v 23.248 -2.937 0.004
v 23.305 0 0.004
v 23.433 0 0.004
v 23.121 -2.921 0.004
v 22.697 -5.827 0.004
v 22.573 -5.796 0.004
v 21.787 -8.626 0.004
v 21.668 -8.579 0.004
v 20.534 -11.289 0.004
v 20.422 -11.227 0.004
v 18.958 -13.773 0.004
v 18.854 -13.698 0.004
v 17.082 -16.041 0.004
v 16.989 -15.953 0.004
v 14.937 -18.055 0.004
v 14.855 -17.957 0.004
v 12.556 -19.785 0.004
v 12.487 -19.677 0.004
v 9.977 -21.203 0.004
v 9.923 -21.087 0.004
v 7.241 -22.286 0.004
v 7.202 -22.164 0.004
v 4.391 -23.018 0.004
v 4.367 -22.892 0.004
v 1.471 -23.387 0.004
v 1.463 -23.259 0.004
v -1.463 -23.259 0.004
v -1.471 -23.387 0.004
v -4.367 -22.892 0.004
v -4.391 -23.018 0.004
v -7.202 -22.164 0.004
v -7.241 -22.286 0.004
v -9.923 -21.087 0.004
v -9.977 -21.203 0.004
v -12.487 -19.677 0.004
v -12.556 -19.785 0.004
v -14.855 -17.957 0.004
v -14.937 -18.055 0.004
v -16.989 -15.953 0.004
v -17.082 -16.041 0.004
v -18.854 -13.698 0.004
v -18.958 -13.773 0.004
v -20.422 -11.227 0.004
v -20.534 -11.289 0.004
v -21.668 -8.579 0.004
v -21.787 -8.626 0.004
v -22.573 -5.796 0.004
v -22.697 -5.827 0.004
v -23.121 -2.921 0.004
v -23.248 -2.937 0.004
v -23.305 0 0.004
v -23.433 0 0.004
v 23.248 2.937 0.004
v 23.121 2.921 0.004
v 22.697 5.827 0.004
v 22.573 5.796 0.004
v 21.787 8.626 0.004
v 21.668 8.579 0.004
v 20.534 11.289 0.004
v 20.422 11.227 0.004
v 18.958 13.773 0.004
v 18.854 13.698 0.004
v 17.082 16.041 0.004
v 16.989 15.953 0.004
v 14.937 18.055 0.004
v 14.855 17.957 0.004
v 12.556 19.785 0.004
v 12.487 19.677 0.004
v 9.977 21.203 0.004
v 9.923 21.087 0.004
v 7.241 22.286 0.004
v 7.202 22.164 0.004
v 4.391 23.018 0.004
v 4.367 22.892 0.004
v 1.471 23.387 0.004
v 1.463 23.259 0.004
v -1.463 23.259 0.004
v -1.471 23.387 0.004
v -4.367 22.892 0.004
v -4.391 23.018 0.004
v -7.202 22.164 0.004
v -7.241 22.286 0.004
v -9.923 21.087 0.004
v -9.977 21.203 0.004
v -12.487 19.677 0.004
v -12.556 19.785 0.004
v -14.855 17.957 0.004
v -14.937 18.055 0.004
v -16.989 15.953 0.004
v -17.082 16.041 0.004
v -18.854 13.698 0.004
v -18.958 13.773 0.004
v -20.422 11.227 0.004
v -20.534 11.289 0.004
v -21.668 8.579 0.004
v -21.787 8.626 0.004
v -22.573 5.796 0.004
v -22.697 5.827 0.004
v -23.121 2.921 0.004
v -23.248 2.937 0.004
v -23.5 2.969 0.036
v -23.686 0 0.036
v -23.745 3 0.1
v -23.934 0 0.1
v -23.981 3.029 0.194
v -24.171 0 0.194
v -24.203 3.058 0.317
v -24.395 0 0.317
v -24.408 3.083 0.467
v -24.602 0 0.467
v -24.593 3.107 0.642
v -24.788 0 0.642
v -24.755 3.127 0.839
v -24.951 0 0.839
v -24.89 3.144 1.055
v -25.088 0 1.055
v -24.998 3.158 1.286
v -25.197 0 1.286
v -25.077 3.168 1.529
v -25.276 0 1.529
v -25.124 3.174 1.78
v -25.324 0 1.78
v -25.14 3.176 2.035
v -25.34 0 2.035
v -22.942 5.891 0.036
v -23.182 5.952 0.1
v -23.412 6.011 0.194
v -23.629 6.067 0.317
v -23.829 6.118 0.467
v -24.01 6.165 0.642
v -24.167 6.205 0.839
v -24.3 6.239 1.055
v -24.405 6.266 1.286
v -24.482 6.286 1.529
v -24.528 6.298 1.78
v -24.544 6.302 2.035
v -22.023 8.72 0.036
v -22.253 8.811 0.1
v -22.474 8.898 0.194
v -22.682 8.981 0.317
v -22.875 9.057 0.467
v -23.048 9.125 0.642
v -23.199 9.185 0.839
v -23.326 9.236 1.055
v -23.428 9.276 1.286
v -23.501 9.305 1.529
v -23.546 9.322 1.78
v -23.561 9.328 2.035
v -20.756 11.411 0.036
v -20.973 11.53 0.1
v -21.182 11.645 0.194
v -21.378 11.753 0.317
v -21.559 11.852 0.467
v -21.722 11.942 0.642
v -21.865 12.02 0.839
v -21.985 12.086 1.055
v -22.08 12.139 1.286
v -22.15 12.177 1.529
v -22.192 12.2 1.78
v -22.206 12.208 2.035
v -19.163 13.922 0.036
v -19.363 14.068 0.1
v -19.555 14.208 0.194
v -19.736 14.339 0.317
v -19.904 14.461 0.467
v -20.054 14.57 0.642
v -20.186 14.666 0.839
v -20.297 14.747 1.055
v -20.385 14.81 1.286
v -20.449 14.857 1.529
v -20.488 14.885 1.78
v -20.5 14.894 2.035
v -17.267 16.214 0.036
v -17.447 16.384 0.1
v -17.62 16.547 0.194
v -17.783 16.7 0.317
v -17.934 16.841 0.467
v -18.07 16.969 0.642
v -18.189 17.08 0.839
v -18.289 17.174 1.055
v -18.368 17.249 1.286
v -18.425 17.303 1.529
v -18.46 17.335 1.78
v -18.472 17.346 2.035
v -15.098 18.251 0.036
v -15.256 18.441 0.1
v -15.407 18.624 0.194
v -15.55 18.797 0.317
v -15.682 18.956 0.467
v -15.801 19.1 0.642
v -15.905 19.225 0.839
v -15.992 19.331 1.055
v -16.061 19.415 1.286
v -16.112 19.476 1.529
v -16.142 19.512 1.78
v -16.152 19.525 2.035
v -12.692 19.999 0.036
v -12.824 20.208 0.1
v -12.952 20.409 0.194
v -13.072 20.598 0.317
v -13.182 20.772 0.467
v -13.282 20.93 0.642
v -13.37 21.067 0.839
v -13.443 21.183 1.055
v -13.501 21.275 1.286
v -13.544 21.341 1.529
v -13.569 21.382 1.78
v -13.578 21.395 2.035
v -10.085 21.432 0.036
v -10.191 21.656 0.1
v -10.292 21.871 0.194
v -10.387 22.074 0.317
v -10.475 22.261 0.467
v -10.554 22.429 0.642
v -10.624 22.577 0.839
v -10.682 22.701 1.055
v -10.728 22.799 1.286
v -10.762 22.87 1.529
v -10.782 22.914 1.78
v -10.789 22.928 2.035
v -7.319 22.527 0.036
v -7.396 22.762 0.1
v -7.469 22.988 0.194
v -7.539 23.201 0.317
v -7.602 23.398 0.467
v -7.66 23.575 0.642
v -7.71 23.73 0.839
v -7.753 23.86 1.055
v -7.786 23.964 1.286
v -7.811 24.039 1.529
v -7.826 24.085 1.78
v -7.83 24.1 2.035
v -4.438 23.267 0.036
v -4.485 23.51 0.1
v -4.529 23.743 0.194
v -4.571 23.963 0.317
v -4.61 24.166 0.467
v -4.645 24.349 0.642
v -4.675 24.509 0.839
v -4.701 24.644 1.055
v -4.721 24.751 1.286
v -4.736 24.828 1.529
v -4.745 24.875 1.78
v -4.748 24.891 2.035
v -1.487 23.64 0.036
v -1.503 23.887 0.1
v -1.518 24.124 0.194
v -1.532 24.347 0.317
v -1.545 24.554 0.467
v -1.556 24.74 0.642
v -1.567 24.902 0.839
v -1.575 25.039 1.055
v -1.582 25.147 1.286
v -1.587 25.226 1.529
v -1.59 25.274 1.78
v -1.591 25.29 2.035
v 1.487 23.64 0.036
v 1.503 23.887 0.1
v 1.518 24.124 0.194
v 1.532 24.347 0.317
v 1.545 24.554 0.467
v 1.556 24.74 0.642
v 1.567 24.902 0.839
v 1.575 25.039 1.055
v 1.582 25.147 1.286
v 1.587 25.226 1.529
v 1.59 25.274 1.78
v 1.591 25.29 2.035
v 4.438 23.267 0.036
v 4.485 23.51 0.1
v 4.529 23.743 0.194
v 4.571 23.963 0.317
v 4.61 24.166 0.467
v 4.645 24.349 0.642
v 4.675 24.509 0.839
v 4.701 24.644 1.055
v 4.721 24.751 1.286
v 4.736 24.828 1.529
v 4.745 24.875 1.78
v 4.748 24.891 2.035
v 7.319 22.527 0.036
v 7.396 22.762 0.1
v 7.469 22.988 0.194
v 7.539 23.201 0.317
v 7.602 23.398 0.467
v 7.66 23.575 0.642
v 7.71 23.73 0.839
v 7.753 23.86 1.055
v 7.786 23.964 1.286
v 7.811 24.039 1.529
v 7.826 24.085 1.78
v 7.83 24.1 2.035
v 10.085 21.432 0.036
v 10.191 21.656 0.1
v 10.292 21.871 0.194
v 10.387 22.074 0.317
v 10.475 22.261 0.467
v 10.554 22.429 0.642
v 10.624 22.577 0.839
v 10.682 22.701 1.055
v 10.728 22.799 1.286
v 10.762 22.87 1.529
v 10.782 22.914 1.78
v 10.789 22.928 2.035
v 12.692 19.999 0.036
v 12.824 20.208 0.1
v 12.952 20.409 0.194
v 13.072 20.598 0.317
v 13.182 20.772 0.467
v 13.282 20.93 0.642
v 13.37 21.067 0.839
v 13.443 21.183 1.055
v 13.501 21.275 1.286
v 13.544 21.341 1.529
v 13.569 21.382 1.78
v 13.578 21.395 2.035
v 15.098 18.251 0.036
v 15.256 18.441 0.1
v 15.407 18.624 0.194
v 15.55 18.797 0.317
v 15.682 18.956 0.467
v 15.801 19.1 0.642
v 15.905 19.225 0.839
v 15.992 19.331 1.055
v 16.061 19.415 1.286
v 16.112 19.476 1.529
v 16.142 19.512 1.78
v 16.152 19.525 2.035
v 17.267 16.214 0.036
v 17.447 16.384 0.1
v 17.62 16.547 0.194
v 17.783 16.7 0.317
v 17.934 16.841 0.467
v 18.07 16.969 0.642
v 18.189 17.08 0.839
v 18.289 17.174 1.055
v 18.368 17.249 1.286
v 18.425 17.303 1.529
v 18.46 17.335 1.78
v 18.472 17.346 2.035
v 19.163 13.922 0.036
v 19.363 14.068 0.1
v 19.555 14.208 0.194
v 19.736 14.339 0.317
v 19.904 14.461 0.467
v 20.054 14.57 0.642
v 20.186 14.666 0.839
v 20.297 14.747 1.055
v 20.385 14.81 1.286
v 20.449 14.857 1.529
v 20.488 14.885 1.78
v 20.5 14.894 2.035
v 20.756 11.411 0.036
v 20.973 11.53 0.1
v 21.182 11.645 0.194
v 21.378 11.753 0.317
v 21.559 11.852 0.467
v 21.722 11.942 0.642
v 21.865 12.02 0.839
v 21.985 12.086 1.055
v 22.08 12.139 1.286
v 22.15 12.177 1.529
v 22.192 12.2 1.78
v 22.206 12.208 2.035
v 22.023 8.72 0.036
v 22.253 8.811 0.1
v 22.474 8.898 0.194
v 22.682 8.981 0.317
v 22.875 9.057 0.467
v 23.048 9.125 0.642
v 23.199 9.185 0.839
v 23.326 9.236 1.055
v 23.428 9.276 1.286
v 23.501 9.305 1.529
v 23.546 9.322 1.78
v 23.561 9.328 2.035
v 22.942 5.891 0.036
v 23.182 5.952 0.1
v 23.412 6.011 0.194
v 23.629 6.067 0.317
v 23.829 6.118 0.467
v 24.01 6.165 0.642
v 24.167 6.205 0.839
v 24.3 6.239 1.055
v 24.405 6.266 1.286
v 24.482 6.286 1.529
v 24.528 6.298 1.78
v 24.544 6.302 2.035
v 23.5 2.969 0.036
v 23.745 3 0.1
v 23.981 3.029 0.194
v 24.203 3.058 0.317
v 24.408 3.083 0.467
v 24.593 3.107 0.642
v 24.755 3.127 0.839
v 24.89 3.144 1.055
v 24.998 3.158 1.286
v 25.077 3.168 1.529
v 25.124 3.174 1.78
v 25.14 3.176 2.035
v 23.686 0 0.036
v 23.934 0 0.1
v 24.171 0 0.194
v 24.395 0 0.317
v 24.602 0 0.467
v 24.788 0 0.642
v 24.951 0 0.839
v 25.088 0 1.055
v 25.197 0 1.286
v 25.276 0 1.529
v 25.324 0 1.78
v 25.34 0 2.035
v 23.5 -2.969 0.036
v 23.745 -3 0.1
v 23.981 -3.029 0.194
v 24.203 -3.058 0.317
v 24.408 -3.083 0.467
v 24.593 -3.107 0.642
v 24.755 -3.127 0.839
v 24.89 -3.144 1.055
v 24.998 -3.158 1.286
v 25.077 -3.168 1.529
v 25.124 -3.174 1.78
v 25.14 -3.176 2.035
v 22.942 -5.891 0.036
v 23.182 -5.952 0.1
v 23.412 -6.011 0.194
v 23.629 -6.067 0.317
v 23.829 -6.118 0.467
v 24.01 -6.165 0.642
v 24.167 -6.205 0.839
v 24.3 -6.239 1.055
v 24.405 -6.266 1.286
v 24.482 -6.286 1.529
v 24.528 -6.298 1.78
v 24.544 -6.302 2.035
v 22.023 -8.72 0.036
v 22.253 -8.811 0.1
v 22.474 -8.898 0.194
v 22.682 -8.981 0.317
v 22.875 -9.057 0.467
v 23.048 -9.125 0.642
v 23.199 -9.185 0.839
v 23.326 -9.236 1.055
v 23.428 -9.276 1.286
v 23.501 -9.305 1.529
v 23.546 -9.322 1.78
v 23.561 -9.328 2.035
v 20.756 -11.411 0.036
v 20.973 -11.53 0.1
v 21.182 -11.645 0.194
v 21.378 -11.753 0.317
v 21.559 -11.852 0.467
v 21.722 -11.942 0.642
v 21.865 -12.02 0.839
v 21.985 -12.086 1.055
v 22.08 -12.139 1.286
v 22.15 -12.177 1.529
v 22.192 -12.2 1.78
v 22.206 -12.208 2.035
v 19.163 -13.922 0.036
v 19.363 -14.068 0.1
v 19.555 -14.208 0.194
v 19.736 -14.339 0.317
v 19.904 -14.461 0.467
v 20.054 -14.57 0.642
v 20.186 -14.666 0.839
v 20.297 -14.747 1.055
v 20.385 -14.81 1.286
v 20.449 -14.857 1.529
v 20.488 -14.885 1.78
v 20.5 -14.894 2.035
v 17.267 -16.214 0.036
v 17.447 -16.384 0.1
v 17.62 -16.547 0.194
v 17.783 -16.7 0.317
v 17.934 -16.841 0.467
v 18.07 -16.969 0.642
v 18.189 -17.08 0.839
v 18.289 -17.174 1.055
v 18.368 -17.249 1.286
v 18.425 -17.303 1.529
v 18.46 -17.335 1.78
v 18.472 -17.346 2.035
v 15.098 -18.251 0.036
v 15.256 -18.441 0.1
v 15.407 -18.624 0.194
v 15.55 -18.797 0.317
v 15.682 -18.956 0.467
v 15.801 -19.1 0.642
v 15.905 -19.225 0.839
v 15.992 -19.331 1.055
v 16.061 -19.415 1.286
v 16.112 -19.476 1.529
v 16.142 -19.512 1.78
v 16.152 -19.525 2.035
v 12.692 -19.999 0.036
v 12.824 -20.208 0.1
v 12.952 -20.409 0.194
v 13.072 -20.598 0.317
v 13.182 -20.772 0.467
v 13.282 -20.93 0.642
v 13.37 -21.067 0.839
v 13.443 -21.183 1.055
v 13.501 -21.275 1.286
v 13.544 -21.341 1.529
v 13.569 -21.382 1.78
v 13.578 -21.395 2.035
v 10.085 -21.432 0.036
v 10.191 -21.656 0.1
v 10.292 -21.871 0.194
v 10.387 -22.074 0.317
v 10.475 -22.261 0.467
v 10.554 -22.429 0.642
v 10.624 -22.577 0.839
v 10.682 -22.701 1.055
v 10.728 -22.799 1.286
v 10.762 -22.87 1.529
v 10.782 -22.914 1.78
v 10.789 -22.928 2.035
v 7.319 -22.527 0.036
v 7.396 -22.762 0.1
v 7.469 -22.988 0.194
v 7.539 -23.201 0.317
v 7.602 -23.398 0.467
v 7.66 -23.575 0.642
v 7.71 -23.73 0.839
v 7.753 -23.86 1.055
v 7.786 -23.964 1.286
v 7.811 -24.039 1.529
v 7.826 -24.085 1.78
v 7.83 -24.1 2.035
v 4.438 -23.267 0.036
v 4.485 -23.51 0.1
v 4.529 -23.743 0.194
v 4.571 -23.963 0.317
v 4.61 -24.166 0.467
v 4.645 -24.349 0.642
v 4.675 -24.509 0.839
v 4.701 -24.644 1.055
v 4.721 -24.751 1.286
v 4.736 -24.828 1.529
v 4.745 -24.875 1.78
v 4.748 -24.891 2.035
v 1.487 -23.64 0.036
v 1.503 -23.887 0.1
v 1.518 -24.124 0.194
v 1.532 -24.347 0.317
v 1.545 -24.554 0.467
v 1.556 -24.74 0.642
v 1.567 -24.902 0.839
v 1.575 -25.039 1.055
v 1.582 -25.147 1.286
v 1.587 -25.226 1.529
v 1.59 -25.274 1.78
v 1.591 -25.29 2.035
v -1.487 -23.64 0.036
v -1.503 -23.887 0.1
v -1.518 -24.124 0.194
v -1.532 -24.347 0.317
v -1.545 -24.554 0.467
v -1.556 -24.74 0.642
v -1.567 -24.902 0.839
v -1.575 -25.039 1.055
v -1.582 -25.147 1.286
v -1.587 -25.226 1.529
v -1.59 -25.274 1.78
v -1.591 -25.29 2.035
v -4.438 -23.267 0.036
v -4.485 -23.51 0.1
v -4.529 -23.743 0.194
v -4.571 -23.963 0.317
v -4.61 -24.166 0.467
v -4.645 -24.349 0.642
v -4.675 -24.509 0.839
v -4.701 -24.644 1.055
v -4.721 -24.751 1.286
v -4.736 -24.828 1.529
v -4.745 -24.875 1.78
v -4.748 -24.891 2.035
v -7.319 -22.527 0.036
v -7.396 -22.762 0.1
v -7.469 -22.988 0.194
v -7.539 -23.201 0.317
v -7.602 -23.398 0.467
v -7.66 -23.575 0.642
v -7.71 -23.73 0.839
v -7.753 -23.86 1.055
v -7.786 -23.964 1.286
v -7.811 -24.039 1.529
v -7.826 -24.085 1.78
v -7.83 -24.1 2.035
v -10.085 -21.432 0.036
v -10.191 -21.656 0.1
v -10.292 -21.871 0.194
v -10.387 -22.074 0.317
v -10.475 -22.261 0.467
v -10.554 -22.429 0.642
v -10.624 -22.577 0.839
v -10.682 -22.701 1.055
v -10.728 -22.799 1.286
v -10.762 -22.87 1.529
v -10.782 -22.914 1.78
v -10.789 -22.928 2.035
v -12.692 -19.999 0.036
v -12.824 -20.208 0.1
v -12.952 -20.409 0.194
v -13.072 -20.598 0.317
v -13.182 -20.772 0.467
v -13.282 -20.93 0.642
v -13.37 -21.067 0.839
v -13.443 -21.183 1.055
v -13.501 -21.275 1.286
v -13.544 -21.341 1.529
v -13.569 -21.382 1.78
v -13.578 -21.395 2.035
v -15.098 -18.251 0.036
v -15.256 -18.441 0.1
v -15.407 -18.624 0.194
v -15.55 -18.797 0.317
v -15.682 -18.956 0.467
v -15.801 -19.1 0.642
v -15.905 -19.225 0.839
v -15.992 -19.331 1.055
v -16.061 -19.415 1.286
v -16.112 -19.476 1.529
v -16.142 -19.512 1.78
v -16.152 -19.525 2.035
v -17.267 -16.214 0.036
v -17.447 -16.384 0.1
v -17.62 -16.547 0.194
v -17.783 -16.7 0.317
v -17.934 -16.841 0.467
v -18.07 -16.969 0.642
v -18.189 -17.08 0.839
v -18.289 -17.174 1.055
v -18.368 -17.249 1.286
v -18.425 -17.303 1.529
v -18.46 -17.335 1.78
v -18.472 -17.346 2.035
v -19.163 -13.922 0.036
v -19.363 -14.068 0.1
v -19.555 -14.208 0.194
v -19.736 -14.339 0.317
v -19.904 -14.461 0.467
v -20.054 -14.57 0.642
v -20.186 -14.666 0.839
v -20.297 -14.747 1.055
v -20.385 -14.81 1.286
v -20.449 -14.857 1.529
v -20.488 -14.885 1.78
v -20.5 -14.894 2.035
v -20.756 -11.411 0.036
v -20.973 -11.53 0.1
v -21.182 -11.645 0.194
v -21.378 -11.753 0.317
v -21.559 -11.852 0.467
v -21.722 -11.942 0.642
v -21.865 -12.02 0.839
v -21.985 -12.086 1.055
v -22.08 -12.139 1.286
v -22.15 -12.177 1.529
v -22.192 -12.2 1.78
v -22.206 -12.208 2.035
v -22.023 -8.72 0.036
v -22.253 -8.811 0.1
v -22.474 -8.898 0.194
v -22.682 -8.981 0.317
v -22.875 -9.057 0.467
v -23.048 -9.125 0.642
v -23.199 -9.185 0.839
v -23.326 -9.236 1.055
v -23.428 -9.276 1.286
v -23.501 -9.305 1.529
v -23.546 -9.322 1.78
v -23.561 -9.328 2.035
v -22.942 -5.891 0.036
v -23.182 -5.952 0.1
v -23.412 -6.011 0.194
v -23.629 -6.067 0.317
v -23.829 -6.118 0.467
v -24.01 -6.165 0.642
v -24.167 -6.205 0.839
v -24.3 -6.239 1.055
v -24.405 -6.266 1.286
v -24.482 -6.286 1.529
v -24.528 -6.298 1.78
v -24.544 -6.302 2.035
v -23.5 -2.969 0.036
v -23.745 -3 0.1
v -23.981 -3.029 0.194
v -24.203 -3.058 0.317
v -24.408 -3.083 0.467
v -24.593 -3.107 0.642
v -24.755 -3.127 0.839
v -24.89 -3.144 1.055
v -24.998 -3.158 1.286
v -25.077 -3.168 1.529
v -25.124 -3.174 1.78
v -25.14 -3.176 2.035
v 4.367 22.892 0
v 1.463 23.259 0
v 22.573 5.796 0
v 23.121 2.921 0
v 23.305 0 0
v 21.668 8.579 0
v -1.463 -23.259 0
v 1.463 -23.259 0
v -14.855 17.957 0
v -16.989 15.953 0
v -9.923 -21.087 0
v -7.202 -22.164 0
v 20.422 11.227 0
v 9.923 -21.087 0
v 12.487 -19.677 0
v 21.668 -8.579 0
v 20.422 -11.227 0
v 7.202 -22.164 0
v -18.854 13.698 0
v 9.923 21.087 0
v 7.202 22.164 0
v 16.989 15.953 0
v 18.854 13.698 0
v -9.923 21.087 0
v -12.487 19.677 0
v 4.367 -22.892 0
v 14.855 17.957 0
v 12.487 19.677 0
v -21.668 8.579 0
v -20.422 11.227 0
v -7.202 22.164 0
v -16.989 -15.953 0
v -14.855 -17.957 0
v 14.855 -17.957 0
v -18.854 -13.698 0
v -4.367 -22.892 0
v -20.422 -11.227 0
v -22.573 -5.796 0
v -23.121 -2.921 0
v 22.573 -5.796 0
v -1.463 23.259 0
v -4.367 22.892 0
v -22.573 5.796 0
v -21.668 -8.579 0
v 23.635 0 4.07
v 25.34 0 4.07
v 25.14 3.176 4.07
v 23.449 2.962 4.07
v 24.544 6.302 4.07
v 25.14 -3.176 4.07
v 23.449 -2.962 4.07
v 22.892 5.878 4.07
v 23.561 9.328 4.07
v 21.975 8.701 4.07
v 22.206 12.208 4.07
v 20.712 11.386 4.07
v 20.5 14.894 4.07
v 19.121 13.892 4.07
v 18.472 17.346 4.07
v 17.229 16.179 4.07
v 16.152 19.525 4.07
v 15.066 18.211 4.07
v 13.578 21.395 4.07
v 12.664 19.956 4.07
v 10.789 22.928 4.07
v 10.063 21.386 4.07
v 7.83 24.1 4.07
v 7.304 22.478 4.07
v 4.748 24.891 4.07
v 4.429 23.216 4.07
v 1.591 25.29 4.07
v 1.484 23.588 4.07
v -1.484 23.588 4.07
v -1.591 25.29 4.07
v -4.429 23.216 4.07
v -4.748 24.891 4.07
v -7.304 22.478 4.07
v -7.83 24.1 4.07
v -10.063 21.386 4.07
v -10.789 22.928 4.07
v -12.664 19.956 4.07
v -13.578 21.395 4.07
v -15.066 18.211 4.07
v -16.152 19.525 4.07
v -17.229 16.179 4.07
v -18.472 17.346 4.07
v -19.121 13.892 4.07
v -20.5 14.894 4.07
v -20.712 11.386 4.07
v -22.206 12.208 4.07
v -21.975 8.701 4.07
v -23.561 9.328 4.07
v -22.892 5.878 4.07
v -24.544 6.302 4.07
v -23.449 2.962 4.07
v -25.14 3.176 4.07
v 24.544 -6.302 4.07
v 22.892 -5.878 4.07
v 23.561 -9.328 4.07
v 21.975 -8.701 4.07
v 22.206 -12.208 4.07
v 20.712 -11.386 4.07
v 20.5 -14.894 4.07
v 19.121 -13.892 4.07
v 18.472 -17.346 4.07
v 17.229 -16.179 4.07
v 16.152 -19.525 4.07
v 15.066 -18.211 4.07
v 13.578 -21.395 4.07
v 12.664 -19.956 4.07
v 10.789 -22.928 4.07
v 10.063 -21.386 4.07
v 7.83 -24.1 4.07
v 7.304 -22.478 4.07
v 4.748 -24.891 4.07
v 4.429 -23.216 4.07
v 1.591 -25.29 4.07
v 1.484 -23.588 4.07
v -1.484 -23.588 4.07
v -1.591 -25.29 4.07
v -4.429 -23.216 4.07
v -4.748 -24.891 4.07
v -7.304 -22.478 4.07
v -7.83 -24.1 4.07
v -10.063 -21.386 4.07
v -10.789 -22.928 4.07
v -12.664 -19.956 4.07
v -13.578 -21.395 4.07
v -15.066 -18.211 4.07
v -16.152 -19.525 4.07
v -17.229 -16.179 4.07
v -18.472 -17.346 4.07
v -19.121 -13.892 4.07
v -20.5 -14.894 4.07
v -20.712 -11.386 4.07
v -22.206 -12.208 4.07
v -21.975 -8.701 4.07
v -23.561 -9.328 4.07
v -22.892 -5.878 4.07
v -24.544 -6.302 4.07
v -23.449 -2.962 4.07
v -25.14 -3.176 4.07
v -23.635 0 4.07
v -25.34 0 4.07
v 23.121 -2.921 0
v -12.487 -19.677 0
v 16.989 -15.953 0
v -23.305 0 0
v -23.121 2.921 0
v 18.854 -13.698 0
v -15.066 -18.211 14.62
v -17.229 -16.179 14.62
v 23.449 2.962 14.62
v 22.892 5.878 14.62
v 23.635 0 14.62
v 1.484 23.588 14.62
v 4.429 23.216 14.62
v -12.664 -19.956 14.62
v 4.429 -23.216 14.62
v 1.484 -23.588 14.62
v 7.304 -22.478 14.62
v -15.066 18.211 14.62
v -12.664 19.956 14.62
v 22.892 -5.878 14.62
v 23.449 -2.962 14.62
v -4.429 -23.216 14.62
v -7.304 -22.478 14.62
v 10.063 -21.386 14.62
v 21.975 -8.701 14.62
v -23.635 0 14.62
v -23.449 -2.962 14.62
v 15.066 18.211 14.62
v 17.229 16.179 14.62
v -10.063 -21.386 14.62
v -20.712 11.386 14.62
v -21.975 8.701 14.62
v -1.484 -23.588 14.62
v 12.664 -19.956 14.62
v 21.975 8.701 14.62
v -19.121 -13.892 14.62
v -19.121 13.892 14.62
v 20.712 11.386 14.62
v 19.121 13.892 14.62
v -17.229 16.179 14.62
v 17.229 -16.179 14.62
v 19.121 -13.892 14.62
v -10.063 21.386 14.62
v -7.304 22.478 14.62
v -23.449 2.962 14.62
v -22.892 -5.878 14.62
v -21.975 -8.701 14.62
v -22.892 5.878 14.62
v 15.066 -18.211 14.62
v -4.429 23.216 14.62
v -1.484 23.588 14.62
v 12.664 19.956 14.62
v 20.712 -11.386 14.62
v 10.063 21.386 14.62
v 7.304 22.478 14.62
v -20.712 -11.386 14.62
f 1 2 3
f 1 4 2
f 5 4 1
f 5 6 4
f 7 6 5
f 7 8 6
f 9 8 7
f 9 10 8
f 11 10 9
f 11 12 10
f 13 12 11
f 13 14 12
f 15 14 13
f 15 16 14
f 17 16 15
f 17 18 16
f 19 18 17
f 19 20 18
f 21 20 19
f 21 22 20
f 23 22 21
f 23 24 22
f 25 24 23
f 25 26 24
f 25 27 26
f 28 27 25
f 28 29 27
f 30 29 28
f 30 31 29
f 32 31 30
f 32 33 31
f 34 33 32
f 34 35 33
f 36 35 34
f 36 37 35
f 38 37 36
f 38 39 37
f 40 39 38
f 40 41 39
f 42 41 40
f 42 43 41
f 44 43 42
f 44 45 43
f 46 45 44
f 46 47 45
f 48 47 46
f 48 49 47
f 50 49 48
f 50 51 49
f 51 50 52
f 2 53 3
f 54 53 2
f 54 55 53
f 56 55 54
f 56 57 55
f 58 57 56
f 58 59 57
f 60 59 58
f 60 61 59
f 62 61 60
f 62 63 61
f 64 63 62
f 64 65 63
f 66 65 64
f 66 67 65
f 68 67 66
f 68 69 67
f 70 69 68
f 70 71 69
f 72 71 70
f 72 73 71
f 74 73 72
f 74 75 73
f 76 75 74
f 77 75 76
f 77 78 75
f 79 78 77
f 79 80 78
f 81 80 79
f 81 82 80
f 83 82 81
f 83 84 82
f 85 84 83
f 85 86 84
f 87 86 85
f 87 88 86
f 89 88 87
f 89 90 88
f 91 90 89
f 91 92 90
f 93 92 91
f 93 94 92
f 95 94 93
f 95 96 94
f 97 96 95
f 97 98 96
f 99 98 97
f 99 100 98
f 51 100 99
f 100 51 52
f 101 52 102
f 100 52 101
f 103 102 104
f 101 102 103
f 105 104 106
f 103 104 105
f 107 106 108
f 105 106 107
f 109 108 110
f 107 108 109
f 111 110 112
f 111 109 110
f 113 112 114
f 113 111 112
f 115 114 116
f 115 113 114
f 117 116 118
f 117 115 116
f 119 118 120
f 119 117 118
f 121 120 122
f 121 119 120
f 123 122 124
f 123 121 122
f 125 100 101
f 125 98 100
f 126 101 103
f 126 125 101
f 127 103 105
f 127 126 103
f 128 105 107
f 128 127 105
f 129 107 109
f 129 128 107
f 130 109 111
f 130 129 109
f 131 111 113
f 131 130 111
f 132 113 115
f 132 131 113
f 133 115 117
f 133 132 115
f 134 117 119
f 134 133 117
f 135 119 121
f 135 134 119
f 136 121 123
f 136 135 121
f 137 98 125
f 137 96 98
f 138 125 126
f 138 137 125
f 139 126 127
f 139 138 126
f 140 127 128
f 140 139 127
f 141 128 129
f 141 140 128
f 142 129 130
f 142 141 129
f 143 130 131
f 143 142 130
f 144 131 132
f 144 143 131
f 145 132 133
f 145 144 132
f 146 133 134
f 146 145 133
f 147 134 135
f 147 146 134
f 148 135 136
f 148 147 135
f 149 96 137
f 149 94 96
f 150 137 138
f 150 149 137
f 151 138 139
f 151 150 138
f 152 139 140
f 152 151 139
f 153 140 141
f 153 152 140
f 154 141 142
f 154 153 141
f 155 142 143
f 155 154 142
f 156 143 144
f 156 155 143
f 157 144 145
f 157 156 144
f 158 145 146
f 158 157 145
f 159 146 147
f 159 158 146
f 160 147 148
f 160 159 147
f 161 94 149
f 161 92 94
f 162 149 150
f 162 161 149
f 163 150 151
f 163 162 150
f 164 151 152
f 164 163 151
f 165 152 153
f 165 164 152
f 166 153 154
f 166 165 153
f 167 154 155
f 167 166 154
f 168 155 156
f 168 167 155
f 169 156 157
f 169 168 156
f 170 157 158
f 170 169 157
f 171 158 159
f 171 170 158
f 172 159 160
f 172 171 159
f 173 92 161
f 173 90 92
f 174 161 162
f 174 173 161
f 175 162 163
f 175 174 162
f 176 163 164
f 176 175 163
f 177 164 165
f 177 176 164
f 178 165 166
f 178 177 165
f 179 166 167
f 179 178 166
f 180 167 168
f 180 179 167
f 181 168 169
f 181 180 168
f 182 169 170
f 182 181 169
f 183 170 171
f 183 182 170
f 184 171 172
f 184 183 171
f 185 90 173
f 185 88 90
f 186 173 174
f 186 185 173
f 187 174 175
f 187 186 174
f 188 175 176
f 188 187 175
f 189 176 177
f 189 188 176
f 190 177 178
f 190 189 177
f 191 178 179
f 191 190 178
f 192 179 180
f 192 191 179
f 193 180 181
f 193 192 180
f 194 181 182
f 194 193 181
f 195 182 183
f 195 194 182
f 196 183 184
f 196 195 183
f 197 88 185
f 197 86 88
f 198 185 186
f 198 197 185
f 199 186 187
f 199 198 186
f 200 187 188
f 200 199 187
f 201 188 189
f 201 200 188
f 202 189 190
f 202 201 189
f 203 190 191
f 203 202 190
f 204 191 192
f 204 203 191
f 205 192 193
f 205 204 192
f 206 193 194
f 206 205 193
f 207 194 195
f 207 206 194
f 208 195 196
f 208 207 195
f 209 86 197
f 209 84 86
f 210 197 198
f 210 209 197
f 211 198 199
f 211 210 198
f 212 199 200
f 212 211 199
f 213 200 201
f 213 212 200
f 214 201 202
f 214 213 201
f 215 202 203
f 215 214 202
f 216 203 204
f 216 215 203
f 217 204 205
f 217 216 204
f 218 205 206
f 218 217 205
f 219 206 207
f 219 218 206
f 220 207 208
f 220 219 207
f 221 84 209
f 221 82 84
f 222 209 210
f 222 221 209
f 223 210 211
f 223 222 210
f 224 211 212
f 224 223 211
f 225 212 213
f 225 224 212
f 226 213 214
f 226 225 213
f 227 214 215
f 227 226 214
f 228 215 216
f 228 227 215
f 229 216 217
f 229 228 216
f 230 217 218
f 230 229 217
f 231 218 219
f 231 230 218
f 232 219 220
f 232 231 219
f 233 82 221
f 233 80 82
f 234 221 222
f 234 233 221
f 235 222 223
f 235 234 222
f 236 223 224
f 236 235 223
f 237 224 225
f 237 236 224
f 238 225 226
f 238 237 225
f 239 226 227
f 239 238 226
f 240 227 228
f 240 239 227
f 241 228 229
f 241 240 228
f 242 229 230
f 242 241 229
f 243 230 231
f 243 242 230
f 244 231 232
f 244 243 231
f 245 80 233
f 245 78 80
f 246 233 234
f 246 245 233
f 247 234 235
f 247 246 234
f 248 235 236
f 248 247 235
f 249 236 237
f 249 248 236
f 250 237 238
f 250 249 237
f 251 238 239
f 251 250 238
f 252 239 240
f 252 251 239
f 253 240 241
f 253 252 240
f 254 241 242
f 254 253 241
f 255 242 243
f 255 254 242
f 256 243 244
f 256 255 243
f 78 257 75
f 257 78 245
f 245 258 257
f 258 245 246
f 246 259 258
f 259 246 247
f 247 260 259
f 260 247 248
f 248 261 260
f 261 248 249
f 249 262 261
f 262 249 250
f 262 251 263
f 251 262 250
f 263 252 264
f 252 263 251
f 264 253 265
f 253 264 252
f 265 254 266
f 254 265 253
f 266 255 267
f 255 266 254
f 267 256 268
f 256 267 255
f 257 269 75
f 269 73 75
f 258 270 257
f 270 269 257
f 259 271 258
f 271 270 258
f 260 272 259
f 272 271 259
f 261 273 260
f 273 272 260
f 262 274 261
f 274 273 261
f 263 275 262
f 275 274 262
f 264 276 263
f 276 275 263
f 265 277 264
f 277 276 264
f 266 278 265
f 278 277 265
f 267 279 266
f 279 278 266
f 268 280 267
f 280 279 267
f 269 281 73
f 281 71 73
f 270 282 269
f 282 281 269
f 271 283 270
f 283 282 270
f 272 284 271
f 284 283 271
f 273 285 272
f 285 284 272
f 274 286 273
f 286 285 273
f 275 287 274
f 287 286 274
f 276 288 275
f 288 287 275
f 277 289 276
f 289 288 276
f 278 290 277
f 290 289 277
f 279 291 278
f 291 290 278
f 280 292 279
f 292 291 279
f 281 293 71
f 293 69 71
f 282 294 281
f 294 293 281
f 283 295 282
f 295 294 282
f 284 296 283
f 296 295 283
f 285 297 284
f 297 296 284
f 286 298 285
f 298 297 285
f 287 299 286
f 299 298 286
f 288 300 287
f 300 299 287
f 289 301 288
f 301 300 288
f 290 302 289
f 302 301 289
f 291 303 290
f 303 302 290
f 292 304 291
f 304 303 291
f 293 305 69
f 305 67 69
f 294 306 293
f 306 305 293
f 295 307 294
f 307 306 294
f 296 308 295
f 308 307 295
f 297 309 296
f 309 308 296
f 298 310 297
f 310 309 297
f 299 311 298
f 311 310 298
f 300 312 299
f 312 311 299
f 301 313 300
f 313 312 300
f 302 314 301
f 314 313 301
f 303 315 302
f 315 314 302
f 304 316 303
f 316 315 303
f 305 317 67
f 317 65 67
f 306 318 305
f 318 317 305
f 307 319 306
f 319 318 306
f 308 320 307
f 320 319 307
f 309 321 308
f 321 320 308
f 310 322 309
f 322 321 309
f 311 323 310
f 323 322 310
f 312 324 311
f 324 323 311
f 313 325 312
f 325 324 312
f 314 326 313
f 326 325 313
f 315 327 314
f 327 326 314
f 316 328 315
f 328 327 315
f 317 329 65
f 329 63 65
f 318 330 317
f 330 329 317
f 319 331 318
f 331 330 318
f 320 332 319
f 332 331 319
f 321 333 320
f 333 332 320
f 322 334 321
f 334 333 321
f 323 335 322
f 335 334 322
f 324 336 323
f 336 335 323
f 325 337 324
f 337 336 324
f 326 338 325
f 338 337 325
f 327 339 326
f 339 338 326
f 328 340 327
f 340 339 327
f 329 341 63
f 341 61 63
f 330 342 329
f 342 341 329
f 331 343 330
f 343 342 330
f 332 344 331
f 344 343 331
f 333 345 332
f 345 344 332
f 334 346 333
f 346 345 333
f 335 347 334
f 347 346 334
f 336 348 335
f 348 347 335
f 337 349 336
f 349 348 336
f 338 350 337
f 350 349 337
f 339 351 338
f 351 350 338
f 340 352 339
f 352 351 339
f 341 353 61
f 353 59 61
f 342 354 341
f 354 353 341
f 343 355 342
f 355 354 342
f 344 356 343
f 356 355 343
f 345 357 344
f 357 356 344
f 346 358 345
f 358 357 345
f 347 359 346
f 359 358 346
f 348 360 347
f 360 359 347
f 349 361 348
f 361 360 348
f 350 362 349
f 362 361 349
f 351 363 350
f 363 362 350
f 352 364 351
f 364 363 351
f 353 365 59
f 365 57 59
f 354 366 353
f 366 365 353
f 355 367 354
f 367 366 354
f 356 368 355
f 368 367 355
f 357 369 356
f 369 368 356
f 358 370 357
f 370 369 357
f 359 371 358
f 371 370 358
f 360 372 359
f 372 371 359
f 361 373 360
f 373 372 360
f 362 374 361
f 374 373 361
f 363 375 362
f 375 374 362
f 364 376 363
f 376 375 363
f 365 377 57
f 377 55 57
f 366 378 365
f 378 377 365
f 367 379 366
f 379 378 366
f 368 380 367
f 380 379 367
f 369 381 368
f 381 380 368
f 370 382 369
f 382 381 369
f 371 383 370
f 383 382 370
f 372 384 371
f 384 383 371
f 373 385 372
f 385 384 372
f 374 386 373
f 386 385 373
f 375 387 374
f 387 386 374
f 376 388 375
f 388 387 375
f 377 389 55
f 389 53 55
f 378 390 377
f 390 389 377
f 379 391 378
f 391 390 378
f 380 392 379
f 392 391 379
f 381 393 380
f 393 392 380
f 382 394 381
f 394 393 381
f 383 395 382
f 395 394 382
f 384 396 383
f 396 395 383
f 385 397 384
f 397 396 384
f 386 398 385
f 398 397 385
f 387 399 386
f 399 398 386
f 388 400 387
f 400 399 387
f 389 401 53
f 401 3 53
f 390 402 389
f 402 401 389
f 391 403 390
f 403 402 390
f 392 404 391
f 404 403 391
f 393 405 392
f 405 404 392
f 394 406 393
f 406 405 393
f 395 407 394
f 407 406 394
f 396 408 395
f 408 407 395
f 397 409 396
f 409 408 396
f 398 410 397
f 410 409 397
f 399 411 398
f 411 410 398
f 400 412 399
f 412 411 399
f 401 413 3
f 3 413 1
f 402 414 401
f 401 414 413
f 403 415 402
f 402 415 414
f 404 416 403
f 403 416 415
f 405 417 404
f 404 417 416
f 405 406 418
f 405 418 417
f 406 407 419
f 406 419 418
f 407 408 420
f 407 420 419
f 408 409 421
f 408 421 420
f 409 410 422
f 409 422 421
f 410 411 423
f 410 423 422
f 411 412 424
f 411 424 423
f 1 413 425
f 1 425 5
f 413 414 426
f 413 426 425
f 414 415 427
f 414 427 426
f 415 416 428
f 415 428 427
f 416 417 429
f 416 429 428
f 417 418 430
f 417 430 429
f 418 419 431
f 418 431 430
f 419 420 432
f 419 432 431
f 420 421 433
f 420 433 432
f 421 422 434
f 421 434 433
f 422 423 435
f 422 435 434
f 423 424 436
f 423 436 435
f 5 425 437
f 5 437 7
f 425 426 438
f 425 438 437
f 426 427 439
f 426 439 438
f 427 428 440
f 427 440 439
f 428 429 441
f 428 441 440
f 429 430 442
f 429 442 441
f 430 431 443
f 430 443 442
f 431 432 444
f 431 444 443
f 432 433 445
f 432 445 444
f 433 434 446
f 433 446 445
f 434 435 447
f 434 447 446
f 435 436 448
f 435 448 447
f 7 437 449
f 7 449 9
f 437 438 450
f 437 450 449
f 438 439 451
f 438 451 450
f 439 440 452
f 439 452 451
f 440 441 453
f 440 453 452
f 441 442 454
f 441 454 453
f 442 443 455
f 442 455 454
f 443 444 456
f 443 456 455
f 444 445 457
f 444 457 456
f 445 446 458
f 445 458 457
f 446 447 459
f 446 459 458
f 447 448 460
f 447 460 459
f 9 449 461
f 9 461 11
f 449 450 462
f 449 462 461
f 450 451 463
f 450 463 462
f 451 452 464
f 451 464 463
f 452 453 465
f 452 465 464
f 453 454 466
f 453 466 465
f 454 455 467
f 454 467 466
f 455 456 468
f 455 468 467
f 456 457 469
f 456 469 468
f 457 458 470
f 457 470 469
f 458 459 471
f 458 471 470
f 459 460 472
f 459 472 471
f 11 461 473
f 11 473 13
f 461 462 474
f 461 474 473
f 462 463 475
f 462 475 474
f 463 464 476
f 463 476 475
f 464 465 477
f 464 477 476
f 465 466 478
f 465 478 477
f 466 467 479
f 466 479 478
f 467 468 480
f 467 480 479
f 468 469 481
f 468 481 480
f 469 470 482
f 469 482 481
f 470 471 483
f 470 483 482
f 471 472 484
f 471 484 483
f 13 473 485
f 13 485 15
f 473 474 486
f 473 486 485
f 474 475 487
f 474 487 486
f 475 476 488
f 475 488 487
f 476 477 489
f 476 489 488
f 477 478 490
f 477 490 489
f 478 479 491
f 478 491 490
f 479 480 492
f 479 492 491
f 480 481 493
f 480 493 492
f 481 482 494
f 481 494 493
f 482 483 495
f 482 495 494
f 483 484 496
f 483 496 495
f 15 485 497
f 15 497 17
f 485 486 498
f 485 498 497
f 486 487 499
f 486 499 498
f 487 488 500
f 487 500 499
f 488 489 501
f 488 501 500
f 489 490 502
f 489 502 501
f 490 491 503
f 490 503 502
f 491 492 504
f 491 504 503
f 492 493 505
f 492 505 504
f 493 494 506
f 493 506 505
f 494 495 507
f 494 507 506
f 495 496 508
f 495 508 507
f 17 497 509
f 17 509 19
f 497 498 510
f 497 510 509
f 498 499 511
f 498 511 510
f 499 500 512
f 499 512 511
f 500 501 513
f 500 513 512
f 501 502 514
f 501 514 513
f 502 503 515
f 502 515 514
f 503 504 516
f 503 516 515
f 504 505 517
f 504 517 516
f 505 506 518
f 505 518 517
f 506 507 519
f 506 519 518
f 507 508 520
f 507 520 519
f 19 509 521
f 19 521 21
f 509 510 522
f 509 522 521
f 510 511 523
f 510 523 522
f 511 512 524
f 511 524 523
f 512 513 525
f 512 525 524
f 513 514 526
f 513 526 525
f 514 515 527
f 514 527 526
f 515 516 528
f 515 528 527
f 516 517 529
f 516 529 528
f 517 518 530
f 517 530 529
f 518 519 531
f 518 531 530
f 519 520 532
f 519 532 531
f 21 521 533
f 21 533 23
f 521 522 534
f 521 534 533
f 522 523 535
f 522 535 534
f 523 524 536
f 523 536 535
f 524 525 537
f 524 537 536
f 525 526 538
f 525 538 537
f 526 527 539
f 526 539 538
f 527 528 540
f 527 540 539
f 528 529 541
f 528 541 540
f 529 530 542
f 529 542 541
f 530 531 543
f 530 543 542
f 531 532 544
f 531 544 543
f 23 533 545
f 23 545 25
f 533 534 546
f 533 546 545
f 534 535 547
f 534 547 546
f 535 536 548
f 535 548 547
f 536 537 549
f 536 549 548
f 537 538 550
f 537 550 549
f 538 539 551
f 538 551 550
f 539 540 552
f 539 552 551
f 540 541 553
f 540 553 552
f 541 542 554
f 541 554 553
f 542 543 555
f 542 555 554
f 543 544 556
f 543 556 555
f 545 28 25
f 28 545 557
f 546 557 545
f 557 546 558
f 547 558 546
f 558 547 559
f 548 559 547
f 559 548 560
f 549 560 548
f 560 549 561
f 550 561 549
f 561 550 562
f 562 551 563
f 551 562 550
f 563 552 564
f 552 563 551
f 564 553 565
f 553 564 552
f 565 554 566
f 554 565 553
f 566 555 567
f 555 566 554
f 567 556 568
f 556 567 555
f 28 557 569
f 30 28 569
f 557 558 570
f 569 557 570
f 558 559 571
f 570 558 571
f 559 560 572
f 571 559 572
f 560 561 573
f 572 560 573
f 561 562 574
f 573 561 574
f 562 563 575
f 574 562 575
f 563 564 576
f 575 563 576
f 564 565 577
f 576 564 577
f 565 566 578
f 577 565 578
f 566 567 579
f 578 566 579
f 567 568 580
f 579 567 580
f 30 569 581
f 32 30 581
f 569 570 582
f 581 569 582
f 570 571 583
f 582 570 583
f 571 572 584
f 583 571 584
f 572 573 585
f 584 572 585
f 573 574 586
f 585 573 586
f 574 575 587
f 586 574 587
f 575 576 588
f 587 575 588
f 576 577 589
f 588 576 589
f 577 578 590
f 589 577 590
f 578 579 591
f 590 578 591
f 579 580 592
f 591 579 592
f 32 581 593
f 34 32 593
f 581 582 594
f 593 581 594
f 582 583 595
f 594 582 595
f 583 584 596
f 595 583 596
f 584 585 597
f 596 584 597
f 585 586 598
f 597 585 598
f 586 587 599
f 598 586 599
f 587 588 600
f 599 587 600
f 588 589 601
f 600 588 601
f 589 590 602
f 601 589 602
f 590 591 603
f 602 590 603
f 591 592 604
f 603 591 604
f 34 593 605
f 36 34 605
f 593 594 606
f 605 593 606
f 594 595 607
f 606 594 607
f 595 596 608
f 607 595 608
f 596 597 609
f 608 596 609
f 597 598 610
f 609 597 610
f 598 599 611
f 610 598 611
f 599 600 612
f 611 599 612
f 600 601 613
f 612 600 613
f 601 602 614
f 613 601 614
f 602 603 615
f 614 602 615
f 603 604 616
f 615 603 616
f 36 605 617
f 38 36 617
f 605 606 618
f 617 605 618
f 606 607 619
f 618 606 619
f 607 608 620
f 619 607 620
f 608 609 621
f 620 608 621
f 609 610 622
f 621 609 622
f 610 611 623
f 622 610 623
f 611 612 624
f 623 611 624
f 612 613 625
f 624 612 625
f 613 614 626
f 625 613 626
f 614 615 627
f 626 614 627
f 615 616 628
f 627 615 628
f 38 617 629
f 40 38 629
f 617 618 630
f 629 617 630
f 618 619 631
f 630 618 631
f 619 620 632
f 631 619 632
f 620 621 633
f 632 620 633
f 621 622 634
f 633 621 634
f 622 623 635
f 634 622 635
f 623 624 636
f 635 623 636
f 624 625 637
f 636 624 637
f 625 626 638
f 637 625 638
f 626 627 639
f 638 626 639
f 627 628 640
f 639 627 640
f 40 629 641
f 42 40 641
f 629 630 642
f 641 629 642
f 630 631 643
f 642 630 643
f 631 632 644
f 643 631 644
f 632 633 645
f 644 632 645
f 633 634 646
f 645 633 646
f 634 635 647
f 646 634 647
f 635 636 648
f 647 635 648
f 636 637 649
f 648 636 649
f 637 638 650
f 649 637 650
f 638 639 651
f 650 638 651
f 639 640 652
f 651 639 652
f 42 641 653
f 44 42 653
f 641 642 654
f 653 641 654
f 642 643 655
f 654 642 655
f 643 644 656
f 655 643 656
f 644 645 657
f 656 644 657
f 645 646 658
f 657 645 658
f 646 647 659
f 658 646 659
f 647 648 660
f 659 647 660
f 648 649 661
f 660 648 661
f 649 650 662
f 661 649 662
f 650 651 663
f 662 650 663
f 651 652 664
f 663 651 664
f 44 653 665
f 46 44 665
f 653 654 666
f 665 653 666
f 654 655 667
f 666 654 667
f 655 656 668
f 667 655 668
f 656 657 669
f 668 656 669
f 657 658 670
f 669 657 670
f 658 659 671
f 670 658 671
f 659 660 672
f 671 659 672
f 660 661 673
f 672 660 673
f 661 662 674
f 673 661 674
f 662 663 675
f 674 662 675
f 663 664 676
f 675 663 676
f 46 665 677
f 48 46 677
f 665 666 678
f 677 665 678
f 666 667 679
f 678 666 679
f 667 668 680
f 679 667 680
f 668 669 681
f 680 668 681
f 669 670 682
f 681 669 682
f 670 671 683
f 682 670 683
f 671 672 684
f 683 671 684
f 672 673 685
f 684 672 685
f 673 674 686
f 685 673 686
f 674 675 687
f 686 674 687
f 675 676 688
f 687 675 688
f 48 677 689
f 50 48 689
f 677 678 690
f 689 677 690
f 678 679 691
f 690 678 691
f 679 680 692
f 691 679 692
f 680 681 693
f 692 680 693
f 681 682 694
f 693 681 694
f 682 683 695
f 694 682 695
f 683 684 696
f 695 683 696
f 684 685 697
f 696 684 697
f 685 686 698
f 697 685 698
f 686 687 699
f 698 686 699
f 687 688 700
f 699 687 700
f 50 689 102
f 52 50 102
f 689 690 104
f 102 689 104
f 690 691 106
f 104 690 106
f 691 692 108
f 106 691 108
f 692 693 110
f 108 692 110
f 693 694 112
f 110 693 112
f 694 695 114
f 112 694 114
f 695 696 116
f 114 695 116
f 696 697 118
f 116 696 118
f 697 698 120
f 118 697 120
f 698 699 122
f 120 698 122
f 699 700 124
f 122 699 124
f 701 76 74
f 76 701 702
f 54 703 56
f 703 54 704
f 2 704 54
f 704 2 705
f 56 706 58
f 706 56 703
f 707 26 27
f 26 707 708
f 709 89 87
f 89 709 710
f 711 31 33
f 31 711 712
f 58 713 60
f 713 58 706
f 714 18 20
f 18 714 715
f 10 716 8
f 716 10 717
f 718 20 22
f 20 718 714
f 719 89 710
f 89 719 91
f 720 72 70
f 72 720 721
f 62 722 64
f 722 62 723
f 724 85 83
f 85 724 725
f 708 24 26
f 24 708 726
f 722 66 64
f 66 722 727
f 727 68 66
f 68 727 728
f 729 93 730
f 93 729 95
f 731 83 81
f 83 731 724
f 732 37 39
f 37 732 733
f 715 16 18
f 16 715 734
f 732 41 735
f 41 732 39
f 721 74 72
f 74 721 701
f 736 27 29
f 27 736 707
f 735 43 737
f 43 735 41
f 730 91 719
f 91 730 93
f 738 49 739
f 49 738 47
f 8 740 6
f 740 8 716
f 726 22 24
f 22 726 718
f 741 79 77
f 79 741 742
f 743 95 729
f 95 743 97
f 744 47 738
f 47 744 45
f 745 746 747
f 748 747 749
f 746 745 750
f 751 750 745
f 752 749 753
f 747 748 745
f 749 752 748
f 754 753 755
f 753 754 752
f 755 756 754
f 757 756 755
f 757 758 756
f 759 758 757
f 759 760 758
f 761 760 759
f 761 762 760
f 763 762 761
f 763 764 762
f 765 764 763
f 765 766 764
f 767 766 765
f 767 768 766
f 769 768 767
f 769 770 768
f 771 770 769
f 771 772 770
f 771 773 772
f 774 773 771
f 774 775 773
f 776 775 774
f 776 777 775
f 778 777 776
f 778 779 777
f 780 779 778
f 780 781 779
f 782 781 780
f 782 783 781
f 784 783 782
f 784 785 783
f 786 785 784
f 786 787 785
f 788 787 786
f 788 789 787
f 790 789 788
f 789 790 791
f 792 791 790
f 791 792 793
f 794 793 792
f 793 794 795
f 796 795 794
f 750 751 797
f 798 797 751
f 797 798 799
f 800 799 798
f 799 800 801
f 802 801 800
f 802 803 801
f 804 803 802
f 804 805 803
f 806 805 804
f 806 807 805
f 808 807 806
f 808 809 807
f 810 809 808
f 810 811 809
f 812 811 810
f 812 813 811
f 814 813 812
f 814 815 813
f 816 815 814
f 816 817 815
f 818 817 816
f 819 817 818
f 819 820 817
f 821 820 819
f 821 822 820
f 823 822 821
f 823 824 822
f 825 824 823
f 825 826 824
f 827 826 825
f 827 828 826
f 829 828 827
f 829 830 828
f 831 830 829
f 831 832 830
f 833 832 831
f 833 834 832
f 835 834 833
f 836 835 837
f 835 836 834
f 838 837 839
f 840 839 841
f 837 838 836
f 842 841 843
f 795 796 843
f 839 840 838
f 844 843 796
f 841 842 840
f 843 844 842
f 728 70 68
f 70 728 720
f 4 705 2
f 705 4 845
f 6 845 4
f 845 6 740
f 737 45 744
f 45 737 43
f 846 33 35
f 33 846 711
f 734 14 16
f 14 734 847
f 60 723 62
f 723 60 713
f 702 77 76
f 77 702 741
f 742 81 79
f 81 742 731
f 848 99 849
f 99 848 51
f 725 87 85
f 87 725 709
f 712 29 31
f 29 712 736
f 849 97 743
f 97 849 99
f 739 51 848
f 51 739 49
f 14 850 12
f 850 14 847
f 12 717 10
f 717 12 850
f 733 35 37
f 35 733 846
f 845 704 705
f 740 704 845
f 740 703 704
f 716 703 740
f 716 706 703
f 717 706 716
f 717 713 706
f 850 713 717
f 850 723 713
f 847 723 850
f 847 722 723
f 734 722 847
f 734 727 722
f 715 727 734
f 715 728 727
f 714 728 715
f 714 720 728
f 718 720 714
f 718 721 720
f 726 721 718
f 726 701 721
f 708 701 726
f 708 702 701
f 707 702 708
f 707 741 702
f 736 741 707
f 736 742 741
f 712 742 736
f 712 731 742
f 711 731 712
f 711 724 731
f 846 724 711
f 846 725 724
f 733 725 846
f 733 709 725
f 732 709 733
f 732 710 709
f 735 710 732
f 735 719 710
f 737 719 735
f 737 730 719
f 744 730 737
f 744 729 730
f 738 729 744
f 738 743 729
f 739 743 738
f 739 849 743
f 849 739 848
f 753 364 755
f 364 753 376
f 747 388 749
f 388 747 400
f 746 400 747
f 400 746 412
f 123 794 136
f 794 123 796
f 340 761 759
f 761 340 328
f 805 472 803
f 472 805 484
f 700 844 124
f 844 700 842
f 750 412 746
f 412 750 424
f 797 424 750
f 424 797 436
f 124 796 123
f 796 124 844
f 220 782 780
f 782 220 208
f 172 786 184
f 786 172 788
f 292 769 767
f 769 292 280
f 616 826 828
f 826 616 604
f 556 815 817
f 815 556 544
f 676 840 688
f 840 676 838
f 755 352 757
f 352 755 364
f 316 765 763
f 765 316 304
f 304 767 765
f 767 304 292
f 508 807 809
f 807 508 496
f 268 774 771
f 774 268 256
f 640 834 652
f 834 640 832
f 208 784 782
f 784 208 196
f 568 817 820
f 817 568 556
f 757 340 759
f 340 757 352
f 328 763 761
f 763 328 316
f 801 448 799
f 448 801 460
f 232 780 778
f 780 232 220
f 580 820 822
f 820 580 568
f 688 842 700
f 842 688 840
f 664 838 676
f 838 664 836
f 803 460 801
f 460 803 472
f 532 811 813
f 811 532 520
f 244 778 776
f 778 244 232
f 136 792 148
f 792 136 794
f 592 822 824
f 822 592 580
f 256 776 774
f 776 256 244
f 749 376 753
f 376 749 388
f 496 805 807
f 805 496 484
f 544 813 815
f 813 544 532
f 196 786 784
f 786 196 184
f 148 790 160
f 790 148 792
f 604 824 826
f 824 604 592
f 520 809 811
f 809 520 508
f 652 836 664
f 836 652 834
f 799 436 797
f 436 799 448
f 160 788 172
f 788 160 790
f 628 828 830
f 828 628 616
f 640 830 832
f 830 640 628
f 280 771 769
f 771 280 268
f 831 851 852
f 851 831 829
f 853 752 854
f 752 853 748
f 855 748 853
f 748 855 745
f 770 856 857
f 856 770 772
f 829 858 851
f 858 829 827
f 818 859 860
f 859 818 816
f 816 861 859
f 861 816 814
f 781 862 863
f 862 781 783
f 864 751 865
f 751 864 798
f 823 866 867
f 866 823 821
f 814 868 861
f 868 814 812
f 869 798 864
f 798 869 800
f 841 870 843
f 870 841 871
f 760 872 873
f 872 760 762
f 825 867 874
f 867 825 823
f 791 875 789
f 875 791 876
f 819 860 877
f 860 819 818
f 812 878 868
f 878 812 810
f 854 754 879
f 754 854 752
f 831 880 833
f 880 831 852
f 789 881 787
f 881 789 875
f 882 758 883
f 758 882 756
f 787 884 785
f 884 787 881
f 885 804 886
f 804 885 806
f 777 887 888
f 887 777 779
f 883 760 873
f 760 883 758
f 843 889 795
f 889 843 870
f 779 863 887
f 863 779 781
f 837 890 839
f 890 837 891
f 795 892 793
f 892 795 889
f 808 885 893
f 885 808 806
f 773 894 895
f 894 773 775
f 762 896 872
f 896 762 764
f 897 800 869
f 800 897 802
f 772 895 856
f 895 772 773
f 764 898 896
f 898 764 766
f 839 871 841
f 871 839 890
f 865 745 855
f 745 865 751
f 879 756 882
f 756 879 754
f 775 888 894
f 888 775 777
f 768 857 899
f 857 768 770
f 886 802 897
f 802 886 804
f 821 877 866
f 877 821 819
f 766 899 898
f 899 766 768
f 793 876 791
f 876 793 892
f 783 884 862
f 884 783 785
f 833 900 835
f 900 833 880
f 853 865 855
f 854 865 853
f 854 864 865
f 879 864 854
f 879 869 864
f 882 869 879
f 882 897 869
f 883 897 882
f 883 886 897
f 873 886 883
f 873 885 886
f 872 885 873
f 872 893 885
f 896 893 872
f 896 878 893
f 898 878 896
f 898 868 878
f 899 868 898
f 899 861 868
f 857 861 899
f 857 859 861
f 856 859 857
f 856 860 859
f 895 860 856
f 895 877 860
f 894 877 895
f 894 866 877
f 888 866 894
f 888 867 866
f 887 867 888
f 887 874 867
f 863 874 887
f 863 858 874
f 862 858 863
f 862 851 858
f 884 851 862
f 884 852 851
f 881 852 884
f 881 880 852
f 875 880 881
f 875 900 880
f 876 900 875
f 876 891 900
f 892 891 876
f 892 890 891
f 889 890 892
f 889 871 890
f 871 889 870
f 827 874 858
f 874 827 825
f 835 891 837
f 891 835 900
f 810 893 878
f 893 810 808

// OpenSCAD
// file: windvane_cap.scad
// (C) Paul Sonkoly - 2021
// Cape Horn Wind vane closing caps


// bottom thickness - aka flush plate thickness
// bottom diam - flush plate diameter

// shaft diam - part that goes in the tube
// height - height of the model including flush plate

// cut hole in the middle 
// hole_diam - if we cut hole.. diameter 

module cap(bottom_thickness,
           bottom_diam,
           shaft_diam,
           height,
           cut_hole = false,
           hole_diam) {

    bottom_rad = bottom_diam / 2;

    module torus(r1, r2) {
        rotate_extrude() {
        translate([r2 - r1, 0, 0])
          circle(r1);
        }
    }
    
    module bottom() {
        torus(r1 = bottom_thickness / 2, r2 = bottom_rad);
        translate([0, 0, -bottom_thickness / 2])
          cylinder(h = bottom_thickness, d = bottom_diam - bottom_thickness);
        cylinder(h = bottom_thickness / 2, d = bottom_diam);
    }
    
    module shaft() {   
        translate([0, 0, bottom_thickness / 2])
          cylinder(h=height - bottom_thickness, d = shaft_diam);
    }
    
    module mid_hole() {
        translate([0, 0, - bottom_thickness / 2])
          cylinder(d = hole_diam, h = height);
    }

    translate([0, 0, bottom_thickness / 2]) {
        if (cut_hole) {
            difference() {
                union() {
                    bottom();
                    shaft();
                }
    
                mid_hole();
            }
        }
        else {
            bottom();
            shaft();
        }      
  }
}
// main file
use <windvane_cap.scad>;

$fn = 50;

cap(bottom_thickness = 4.07,
    bottom_diam = 50.68,
    shaft_diam = 47.27,
    height = 14.62,
    cut_hole = false);  
